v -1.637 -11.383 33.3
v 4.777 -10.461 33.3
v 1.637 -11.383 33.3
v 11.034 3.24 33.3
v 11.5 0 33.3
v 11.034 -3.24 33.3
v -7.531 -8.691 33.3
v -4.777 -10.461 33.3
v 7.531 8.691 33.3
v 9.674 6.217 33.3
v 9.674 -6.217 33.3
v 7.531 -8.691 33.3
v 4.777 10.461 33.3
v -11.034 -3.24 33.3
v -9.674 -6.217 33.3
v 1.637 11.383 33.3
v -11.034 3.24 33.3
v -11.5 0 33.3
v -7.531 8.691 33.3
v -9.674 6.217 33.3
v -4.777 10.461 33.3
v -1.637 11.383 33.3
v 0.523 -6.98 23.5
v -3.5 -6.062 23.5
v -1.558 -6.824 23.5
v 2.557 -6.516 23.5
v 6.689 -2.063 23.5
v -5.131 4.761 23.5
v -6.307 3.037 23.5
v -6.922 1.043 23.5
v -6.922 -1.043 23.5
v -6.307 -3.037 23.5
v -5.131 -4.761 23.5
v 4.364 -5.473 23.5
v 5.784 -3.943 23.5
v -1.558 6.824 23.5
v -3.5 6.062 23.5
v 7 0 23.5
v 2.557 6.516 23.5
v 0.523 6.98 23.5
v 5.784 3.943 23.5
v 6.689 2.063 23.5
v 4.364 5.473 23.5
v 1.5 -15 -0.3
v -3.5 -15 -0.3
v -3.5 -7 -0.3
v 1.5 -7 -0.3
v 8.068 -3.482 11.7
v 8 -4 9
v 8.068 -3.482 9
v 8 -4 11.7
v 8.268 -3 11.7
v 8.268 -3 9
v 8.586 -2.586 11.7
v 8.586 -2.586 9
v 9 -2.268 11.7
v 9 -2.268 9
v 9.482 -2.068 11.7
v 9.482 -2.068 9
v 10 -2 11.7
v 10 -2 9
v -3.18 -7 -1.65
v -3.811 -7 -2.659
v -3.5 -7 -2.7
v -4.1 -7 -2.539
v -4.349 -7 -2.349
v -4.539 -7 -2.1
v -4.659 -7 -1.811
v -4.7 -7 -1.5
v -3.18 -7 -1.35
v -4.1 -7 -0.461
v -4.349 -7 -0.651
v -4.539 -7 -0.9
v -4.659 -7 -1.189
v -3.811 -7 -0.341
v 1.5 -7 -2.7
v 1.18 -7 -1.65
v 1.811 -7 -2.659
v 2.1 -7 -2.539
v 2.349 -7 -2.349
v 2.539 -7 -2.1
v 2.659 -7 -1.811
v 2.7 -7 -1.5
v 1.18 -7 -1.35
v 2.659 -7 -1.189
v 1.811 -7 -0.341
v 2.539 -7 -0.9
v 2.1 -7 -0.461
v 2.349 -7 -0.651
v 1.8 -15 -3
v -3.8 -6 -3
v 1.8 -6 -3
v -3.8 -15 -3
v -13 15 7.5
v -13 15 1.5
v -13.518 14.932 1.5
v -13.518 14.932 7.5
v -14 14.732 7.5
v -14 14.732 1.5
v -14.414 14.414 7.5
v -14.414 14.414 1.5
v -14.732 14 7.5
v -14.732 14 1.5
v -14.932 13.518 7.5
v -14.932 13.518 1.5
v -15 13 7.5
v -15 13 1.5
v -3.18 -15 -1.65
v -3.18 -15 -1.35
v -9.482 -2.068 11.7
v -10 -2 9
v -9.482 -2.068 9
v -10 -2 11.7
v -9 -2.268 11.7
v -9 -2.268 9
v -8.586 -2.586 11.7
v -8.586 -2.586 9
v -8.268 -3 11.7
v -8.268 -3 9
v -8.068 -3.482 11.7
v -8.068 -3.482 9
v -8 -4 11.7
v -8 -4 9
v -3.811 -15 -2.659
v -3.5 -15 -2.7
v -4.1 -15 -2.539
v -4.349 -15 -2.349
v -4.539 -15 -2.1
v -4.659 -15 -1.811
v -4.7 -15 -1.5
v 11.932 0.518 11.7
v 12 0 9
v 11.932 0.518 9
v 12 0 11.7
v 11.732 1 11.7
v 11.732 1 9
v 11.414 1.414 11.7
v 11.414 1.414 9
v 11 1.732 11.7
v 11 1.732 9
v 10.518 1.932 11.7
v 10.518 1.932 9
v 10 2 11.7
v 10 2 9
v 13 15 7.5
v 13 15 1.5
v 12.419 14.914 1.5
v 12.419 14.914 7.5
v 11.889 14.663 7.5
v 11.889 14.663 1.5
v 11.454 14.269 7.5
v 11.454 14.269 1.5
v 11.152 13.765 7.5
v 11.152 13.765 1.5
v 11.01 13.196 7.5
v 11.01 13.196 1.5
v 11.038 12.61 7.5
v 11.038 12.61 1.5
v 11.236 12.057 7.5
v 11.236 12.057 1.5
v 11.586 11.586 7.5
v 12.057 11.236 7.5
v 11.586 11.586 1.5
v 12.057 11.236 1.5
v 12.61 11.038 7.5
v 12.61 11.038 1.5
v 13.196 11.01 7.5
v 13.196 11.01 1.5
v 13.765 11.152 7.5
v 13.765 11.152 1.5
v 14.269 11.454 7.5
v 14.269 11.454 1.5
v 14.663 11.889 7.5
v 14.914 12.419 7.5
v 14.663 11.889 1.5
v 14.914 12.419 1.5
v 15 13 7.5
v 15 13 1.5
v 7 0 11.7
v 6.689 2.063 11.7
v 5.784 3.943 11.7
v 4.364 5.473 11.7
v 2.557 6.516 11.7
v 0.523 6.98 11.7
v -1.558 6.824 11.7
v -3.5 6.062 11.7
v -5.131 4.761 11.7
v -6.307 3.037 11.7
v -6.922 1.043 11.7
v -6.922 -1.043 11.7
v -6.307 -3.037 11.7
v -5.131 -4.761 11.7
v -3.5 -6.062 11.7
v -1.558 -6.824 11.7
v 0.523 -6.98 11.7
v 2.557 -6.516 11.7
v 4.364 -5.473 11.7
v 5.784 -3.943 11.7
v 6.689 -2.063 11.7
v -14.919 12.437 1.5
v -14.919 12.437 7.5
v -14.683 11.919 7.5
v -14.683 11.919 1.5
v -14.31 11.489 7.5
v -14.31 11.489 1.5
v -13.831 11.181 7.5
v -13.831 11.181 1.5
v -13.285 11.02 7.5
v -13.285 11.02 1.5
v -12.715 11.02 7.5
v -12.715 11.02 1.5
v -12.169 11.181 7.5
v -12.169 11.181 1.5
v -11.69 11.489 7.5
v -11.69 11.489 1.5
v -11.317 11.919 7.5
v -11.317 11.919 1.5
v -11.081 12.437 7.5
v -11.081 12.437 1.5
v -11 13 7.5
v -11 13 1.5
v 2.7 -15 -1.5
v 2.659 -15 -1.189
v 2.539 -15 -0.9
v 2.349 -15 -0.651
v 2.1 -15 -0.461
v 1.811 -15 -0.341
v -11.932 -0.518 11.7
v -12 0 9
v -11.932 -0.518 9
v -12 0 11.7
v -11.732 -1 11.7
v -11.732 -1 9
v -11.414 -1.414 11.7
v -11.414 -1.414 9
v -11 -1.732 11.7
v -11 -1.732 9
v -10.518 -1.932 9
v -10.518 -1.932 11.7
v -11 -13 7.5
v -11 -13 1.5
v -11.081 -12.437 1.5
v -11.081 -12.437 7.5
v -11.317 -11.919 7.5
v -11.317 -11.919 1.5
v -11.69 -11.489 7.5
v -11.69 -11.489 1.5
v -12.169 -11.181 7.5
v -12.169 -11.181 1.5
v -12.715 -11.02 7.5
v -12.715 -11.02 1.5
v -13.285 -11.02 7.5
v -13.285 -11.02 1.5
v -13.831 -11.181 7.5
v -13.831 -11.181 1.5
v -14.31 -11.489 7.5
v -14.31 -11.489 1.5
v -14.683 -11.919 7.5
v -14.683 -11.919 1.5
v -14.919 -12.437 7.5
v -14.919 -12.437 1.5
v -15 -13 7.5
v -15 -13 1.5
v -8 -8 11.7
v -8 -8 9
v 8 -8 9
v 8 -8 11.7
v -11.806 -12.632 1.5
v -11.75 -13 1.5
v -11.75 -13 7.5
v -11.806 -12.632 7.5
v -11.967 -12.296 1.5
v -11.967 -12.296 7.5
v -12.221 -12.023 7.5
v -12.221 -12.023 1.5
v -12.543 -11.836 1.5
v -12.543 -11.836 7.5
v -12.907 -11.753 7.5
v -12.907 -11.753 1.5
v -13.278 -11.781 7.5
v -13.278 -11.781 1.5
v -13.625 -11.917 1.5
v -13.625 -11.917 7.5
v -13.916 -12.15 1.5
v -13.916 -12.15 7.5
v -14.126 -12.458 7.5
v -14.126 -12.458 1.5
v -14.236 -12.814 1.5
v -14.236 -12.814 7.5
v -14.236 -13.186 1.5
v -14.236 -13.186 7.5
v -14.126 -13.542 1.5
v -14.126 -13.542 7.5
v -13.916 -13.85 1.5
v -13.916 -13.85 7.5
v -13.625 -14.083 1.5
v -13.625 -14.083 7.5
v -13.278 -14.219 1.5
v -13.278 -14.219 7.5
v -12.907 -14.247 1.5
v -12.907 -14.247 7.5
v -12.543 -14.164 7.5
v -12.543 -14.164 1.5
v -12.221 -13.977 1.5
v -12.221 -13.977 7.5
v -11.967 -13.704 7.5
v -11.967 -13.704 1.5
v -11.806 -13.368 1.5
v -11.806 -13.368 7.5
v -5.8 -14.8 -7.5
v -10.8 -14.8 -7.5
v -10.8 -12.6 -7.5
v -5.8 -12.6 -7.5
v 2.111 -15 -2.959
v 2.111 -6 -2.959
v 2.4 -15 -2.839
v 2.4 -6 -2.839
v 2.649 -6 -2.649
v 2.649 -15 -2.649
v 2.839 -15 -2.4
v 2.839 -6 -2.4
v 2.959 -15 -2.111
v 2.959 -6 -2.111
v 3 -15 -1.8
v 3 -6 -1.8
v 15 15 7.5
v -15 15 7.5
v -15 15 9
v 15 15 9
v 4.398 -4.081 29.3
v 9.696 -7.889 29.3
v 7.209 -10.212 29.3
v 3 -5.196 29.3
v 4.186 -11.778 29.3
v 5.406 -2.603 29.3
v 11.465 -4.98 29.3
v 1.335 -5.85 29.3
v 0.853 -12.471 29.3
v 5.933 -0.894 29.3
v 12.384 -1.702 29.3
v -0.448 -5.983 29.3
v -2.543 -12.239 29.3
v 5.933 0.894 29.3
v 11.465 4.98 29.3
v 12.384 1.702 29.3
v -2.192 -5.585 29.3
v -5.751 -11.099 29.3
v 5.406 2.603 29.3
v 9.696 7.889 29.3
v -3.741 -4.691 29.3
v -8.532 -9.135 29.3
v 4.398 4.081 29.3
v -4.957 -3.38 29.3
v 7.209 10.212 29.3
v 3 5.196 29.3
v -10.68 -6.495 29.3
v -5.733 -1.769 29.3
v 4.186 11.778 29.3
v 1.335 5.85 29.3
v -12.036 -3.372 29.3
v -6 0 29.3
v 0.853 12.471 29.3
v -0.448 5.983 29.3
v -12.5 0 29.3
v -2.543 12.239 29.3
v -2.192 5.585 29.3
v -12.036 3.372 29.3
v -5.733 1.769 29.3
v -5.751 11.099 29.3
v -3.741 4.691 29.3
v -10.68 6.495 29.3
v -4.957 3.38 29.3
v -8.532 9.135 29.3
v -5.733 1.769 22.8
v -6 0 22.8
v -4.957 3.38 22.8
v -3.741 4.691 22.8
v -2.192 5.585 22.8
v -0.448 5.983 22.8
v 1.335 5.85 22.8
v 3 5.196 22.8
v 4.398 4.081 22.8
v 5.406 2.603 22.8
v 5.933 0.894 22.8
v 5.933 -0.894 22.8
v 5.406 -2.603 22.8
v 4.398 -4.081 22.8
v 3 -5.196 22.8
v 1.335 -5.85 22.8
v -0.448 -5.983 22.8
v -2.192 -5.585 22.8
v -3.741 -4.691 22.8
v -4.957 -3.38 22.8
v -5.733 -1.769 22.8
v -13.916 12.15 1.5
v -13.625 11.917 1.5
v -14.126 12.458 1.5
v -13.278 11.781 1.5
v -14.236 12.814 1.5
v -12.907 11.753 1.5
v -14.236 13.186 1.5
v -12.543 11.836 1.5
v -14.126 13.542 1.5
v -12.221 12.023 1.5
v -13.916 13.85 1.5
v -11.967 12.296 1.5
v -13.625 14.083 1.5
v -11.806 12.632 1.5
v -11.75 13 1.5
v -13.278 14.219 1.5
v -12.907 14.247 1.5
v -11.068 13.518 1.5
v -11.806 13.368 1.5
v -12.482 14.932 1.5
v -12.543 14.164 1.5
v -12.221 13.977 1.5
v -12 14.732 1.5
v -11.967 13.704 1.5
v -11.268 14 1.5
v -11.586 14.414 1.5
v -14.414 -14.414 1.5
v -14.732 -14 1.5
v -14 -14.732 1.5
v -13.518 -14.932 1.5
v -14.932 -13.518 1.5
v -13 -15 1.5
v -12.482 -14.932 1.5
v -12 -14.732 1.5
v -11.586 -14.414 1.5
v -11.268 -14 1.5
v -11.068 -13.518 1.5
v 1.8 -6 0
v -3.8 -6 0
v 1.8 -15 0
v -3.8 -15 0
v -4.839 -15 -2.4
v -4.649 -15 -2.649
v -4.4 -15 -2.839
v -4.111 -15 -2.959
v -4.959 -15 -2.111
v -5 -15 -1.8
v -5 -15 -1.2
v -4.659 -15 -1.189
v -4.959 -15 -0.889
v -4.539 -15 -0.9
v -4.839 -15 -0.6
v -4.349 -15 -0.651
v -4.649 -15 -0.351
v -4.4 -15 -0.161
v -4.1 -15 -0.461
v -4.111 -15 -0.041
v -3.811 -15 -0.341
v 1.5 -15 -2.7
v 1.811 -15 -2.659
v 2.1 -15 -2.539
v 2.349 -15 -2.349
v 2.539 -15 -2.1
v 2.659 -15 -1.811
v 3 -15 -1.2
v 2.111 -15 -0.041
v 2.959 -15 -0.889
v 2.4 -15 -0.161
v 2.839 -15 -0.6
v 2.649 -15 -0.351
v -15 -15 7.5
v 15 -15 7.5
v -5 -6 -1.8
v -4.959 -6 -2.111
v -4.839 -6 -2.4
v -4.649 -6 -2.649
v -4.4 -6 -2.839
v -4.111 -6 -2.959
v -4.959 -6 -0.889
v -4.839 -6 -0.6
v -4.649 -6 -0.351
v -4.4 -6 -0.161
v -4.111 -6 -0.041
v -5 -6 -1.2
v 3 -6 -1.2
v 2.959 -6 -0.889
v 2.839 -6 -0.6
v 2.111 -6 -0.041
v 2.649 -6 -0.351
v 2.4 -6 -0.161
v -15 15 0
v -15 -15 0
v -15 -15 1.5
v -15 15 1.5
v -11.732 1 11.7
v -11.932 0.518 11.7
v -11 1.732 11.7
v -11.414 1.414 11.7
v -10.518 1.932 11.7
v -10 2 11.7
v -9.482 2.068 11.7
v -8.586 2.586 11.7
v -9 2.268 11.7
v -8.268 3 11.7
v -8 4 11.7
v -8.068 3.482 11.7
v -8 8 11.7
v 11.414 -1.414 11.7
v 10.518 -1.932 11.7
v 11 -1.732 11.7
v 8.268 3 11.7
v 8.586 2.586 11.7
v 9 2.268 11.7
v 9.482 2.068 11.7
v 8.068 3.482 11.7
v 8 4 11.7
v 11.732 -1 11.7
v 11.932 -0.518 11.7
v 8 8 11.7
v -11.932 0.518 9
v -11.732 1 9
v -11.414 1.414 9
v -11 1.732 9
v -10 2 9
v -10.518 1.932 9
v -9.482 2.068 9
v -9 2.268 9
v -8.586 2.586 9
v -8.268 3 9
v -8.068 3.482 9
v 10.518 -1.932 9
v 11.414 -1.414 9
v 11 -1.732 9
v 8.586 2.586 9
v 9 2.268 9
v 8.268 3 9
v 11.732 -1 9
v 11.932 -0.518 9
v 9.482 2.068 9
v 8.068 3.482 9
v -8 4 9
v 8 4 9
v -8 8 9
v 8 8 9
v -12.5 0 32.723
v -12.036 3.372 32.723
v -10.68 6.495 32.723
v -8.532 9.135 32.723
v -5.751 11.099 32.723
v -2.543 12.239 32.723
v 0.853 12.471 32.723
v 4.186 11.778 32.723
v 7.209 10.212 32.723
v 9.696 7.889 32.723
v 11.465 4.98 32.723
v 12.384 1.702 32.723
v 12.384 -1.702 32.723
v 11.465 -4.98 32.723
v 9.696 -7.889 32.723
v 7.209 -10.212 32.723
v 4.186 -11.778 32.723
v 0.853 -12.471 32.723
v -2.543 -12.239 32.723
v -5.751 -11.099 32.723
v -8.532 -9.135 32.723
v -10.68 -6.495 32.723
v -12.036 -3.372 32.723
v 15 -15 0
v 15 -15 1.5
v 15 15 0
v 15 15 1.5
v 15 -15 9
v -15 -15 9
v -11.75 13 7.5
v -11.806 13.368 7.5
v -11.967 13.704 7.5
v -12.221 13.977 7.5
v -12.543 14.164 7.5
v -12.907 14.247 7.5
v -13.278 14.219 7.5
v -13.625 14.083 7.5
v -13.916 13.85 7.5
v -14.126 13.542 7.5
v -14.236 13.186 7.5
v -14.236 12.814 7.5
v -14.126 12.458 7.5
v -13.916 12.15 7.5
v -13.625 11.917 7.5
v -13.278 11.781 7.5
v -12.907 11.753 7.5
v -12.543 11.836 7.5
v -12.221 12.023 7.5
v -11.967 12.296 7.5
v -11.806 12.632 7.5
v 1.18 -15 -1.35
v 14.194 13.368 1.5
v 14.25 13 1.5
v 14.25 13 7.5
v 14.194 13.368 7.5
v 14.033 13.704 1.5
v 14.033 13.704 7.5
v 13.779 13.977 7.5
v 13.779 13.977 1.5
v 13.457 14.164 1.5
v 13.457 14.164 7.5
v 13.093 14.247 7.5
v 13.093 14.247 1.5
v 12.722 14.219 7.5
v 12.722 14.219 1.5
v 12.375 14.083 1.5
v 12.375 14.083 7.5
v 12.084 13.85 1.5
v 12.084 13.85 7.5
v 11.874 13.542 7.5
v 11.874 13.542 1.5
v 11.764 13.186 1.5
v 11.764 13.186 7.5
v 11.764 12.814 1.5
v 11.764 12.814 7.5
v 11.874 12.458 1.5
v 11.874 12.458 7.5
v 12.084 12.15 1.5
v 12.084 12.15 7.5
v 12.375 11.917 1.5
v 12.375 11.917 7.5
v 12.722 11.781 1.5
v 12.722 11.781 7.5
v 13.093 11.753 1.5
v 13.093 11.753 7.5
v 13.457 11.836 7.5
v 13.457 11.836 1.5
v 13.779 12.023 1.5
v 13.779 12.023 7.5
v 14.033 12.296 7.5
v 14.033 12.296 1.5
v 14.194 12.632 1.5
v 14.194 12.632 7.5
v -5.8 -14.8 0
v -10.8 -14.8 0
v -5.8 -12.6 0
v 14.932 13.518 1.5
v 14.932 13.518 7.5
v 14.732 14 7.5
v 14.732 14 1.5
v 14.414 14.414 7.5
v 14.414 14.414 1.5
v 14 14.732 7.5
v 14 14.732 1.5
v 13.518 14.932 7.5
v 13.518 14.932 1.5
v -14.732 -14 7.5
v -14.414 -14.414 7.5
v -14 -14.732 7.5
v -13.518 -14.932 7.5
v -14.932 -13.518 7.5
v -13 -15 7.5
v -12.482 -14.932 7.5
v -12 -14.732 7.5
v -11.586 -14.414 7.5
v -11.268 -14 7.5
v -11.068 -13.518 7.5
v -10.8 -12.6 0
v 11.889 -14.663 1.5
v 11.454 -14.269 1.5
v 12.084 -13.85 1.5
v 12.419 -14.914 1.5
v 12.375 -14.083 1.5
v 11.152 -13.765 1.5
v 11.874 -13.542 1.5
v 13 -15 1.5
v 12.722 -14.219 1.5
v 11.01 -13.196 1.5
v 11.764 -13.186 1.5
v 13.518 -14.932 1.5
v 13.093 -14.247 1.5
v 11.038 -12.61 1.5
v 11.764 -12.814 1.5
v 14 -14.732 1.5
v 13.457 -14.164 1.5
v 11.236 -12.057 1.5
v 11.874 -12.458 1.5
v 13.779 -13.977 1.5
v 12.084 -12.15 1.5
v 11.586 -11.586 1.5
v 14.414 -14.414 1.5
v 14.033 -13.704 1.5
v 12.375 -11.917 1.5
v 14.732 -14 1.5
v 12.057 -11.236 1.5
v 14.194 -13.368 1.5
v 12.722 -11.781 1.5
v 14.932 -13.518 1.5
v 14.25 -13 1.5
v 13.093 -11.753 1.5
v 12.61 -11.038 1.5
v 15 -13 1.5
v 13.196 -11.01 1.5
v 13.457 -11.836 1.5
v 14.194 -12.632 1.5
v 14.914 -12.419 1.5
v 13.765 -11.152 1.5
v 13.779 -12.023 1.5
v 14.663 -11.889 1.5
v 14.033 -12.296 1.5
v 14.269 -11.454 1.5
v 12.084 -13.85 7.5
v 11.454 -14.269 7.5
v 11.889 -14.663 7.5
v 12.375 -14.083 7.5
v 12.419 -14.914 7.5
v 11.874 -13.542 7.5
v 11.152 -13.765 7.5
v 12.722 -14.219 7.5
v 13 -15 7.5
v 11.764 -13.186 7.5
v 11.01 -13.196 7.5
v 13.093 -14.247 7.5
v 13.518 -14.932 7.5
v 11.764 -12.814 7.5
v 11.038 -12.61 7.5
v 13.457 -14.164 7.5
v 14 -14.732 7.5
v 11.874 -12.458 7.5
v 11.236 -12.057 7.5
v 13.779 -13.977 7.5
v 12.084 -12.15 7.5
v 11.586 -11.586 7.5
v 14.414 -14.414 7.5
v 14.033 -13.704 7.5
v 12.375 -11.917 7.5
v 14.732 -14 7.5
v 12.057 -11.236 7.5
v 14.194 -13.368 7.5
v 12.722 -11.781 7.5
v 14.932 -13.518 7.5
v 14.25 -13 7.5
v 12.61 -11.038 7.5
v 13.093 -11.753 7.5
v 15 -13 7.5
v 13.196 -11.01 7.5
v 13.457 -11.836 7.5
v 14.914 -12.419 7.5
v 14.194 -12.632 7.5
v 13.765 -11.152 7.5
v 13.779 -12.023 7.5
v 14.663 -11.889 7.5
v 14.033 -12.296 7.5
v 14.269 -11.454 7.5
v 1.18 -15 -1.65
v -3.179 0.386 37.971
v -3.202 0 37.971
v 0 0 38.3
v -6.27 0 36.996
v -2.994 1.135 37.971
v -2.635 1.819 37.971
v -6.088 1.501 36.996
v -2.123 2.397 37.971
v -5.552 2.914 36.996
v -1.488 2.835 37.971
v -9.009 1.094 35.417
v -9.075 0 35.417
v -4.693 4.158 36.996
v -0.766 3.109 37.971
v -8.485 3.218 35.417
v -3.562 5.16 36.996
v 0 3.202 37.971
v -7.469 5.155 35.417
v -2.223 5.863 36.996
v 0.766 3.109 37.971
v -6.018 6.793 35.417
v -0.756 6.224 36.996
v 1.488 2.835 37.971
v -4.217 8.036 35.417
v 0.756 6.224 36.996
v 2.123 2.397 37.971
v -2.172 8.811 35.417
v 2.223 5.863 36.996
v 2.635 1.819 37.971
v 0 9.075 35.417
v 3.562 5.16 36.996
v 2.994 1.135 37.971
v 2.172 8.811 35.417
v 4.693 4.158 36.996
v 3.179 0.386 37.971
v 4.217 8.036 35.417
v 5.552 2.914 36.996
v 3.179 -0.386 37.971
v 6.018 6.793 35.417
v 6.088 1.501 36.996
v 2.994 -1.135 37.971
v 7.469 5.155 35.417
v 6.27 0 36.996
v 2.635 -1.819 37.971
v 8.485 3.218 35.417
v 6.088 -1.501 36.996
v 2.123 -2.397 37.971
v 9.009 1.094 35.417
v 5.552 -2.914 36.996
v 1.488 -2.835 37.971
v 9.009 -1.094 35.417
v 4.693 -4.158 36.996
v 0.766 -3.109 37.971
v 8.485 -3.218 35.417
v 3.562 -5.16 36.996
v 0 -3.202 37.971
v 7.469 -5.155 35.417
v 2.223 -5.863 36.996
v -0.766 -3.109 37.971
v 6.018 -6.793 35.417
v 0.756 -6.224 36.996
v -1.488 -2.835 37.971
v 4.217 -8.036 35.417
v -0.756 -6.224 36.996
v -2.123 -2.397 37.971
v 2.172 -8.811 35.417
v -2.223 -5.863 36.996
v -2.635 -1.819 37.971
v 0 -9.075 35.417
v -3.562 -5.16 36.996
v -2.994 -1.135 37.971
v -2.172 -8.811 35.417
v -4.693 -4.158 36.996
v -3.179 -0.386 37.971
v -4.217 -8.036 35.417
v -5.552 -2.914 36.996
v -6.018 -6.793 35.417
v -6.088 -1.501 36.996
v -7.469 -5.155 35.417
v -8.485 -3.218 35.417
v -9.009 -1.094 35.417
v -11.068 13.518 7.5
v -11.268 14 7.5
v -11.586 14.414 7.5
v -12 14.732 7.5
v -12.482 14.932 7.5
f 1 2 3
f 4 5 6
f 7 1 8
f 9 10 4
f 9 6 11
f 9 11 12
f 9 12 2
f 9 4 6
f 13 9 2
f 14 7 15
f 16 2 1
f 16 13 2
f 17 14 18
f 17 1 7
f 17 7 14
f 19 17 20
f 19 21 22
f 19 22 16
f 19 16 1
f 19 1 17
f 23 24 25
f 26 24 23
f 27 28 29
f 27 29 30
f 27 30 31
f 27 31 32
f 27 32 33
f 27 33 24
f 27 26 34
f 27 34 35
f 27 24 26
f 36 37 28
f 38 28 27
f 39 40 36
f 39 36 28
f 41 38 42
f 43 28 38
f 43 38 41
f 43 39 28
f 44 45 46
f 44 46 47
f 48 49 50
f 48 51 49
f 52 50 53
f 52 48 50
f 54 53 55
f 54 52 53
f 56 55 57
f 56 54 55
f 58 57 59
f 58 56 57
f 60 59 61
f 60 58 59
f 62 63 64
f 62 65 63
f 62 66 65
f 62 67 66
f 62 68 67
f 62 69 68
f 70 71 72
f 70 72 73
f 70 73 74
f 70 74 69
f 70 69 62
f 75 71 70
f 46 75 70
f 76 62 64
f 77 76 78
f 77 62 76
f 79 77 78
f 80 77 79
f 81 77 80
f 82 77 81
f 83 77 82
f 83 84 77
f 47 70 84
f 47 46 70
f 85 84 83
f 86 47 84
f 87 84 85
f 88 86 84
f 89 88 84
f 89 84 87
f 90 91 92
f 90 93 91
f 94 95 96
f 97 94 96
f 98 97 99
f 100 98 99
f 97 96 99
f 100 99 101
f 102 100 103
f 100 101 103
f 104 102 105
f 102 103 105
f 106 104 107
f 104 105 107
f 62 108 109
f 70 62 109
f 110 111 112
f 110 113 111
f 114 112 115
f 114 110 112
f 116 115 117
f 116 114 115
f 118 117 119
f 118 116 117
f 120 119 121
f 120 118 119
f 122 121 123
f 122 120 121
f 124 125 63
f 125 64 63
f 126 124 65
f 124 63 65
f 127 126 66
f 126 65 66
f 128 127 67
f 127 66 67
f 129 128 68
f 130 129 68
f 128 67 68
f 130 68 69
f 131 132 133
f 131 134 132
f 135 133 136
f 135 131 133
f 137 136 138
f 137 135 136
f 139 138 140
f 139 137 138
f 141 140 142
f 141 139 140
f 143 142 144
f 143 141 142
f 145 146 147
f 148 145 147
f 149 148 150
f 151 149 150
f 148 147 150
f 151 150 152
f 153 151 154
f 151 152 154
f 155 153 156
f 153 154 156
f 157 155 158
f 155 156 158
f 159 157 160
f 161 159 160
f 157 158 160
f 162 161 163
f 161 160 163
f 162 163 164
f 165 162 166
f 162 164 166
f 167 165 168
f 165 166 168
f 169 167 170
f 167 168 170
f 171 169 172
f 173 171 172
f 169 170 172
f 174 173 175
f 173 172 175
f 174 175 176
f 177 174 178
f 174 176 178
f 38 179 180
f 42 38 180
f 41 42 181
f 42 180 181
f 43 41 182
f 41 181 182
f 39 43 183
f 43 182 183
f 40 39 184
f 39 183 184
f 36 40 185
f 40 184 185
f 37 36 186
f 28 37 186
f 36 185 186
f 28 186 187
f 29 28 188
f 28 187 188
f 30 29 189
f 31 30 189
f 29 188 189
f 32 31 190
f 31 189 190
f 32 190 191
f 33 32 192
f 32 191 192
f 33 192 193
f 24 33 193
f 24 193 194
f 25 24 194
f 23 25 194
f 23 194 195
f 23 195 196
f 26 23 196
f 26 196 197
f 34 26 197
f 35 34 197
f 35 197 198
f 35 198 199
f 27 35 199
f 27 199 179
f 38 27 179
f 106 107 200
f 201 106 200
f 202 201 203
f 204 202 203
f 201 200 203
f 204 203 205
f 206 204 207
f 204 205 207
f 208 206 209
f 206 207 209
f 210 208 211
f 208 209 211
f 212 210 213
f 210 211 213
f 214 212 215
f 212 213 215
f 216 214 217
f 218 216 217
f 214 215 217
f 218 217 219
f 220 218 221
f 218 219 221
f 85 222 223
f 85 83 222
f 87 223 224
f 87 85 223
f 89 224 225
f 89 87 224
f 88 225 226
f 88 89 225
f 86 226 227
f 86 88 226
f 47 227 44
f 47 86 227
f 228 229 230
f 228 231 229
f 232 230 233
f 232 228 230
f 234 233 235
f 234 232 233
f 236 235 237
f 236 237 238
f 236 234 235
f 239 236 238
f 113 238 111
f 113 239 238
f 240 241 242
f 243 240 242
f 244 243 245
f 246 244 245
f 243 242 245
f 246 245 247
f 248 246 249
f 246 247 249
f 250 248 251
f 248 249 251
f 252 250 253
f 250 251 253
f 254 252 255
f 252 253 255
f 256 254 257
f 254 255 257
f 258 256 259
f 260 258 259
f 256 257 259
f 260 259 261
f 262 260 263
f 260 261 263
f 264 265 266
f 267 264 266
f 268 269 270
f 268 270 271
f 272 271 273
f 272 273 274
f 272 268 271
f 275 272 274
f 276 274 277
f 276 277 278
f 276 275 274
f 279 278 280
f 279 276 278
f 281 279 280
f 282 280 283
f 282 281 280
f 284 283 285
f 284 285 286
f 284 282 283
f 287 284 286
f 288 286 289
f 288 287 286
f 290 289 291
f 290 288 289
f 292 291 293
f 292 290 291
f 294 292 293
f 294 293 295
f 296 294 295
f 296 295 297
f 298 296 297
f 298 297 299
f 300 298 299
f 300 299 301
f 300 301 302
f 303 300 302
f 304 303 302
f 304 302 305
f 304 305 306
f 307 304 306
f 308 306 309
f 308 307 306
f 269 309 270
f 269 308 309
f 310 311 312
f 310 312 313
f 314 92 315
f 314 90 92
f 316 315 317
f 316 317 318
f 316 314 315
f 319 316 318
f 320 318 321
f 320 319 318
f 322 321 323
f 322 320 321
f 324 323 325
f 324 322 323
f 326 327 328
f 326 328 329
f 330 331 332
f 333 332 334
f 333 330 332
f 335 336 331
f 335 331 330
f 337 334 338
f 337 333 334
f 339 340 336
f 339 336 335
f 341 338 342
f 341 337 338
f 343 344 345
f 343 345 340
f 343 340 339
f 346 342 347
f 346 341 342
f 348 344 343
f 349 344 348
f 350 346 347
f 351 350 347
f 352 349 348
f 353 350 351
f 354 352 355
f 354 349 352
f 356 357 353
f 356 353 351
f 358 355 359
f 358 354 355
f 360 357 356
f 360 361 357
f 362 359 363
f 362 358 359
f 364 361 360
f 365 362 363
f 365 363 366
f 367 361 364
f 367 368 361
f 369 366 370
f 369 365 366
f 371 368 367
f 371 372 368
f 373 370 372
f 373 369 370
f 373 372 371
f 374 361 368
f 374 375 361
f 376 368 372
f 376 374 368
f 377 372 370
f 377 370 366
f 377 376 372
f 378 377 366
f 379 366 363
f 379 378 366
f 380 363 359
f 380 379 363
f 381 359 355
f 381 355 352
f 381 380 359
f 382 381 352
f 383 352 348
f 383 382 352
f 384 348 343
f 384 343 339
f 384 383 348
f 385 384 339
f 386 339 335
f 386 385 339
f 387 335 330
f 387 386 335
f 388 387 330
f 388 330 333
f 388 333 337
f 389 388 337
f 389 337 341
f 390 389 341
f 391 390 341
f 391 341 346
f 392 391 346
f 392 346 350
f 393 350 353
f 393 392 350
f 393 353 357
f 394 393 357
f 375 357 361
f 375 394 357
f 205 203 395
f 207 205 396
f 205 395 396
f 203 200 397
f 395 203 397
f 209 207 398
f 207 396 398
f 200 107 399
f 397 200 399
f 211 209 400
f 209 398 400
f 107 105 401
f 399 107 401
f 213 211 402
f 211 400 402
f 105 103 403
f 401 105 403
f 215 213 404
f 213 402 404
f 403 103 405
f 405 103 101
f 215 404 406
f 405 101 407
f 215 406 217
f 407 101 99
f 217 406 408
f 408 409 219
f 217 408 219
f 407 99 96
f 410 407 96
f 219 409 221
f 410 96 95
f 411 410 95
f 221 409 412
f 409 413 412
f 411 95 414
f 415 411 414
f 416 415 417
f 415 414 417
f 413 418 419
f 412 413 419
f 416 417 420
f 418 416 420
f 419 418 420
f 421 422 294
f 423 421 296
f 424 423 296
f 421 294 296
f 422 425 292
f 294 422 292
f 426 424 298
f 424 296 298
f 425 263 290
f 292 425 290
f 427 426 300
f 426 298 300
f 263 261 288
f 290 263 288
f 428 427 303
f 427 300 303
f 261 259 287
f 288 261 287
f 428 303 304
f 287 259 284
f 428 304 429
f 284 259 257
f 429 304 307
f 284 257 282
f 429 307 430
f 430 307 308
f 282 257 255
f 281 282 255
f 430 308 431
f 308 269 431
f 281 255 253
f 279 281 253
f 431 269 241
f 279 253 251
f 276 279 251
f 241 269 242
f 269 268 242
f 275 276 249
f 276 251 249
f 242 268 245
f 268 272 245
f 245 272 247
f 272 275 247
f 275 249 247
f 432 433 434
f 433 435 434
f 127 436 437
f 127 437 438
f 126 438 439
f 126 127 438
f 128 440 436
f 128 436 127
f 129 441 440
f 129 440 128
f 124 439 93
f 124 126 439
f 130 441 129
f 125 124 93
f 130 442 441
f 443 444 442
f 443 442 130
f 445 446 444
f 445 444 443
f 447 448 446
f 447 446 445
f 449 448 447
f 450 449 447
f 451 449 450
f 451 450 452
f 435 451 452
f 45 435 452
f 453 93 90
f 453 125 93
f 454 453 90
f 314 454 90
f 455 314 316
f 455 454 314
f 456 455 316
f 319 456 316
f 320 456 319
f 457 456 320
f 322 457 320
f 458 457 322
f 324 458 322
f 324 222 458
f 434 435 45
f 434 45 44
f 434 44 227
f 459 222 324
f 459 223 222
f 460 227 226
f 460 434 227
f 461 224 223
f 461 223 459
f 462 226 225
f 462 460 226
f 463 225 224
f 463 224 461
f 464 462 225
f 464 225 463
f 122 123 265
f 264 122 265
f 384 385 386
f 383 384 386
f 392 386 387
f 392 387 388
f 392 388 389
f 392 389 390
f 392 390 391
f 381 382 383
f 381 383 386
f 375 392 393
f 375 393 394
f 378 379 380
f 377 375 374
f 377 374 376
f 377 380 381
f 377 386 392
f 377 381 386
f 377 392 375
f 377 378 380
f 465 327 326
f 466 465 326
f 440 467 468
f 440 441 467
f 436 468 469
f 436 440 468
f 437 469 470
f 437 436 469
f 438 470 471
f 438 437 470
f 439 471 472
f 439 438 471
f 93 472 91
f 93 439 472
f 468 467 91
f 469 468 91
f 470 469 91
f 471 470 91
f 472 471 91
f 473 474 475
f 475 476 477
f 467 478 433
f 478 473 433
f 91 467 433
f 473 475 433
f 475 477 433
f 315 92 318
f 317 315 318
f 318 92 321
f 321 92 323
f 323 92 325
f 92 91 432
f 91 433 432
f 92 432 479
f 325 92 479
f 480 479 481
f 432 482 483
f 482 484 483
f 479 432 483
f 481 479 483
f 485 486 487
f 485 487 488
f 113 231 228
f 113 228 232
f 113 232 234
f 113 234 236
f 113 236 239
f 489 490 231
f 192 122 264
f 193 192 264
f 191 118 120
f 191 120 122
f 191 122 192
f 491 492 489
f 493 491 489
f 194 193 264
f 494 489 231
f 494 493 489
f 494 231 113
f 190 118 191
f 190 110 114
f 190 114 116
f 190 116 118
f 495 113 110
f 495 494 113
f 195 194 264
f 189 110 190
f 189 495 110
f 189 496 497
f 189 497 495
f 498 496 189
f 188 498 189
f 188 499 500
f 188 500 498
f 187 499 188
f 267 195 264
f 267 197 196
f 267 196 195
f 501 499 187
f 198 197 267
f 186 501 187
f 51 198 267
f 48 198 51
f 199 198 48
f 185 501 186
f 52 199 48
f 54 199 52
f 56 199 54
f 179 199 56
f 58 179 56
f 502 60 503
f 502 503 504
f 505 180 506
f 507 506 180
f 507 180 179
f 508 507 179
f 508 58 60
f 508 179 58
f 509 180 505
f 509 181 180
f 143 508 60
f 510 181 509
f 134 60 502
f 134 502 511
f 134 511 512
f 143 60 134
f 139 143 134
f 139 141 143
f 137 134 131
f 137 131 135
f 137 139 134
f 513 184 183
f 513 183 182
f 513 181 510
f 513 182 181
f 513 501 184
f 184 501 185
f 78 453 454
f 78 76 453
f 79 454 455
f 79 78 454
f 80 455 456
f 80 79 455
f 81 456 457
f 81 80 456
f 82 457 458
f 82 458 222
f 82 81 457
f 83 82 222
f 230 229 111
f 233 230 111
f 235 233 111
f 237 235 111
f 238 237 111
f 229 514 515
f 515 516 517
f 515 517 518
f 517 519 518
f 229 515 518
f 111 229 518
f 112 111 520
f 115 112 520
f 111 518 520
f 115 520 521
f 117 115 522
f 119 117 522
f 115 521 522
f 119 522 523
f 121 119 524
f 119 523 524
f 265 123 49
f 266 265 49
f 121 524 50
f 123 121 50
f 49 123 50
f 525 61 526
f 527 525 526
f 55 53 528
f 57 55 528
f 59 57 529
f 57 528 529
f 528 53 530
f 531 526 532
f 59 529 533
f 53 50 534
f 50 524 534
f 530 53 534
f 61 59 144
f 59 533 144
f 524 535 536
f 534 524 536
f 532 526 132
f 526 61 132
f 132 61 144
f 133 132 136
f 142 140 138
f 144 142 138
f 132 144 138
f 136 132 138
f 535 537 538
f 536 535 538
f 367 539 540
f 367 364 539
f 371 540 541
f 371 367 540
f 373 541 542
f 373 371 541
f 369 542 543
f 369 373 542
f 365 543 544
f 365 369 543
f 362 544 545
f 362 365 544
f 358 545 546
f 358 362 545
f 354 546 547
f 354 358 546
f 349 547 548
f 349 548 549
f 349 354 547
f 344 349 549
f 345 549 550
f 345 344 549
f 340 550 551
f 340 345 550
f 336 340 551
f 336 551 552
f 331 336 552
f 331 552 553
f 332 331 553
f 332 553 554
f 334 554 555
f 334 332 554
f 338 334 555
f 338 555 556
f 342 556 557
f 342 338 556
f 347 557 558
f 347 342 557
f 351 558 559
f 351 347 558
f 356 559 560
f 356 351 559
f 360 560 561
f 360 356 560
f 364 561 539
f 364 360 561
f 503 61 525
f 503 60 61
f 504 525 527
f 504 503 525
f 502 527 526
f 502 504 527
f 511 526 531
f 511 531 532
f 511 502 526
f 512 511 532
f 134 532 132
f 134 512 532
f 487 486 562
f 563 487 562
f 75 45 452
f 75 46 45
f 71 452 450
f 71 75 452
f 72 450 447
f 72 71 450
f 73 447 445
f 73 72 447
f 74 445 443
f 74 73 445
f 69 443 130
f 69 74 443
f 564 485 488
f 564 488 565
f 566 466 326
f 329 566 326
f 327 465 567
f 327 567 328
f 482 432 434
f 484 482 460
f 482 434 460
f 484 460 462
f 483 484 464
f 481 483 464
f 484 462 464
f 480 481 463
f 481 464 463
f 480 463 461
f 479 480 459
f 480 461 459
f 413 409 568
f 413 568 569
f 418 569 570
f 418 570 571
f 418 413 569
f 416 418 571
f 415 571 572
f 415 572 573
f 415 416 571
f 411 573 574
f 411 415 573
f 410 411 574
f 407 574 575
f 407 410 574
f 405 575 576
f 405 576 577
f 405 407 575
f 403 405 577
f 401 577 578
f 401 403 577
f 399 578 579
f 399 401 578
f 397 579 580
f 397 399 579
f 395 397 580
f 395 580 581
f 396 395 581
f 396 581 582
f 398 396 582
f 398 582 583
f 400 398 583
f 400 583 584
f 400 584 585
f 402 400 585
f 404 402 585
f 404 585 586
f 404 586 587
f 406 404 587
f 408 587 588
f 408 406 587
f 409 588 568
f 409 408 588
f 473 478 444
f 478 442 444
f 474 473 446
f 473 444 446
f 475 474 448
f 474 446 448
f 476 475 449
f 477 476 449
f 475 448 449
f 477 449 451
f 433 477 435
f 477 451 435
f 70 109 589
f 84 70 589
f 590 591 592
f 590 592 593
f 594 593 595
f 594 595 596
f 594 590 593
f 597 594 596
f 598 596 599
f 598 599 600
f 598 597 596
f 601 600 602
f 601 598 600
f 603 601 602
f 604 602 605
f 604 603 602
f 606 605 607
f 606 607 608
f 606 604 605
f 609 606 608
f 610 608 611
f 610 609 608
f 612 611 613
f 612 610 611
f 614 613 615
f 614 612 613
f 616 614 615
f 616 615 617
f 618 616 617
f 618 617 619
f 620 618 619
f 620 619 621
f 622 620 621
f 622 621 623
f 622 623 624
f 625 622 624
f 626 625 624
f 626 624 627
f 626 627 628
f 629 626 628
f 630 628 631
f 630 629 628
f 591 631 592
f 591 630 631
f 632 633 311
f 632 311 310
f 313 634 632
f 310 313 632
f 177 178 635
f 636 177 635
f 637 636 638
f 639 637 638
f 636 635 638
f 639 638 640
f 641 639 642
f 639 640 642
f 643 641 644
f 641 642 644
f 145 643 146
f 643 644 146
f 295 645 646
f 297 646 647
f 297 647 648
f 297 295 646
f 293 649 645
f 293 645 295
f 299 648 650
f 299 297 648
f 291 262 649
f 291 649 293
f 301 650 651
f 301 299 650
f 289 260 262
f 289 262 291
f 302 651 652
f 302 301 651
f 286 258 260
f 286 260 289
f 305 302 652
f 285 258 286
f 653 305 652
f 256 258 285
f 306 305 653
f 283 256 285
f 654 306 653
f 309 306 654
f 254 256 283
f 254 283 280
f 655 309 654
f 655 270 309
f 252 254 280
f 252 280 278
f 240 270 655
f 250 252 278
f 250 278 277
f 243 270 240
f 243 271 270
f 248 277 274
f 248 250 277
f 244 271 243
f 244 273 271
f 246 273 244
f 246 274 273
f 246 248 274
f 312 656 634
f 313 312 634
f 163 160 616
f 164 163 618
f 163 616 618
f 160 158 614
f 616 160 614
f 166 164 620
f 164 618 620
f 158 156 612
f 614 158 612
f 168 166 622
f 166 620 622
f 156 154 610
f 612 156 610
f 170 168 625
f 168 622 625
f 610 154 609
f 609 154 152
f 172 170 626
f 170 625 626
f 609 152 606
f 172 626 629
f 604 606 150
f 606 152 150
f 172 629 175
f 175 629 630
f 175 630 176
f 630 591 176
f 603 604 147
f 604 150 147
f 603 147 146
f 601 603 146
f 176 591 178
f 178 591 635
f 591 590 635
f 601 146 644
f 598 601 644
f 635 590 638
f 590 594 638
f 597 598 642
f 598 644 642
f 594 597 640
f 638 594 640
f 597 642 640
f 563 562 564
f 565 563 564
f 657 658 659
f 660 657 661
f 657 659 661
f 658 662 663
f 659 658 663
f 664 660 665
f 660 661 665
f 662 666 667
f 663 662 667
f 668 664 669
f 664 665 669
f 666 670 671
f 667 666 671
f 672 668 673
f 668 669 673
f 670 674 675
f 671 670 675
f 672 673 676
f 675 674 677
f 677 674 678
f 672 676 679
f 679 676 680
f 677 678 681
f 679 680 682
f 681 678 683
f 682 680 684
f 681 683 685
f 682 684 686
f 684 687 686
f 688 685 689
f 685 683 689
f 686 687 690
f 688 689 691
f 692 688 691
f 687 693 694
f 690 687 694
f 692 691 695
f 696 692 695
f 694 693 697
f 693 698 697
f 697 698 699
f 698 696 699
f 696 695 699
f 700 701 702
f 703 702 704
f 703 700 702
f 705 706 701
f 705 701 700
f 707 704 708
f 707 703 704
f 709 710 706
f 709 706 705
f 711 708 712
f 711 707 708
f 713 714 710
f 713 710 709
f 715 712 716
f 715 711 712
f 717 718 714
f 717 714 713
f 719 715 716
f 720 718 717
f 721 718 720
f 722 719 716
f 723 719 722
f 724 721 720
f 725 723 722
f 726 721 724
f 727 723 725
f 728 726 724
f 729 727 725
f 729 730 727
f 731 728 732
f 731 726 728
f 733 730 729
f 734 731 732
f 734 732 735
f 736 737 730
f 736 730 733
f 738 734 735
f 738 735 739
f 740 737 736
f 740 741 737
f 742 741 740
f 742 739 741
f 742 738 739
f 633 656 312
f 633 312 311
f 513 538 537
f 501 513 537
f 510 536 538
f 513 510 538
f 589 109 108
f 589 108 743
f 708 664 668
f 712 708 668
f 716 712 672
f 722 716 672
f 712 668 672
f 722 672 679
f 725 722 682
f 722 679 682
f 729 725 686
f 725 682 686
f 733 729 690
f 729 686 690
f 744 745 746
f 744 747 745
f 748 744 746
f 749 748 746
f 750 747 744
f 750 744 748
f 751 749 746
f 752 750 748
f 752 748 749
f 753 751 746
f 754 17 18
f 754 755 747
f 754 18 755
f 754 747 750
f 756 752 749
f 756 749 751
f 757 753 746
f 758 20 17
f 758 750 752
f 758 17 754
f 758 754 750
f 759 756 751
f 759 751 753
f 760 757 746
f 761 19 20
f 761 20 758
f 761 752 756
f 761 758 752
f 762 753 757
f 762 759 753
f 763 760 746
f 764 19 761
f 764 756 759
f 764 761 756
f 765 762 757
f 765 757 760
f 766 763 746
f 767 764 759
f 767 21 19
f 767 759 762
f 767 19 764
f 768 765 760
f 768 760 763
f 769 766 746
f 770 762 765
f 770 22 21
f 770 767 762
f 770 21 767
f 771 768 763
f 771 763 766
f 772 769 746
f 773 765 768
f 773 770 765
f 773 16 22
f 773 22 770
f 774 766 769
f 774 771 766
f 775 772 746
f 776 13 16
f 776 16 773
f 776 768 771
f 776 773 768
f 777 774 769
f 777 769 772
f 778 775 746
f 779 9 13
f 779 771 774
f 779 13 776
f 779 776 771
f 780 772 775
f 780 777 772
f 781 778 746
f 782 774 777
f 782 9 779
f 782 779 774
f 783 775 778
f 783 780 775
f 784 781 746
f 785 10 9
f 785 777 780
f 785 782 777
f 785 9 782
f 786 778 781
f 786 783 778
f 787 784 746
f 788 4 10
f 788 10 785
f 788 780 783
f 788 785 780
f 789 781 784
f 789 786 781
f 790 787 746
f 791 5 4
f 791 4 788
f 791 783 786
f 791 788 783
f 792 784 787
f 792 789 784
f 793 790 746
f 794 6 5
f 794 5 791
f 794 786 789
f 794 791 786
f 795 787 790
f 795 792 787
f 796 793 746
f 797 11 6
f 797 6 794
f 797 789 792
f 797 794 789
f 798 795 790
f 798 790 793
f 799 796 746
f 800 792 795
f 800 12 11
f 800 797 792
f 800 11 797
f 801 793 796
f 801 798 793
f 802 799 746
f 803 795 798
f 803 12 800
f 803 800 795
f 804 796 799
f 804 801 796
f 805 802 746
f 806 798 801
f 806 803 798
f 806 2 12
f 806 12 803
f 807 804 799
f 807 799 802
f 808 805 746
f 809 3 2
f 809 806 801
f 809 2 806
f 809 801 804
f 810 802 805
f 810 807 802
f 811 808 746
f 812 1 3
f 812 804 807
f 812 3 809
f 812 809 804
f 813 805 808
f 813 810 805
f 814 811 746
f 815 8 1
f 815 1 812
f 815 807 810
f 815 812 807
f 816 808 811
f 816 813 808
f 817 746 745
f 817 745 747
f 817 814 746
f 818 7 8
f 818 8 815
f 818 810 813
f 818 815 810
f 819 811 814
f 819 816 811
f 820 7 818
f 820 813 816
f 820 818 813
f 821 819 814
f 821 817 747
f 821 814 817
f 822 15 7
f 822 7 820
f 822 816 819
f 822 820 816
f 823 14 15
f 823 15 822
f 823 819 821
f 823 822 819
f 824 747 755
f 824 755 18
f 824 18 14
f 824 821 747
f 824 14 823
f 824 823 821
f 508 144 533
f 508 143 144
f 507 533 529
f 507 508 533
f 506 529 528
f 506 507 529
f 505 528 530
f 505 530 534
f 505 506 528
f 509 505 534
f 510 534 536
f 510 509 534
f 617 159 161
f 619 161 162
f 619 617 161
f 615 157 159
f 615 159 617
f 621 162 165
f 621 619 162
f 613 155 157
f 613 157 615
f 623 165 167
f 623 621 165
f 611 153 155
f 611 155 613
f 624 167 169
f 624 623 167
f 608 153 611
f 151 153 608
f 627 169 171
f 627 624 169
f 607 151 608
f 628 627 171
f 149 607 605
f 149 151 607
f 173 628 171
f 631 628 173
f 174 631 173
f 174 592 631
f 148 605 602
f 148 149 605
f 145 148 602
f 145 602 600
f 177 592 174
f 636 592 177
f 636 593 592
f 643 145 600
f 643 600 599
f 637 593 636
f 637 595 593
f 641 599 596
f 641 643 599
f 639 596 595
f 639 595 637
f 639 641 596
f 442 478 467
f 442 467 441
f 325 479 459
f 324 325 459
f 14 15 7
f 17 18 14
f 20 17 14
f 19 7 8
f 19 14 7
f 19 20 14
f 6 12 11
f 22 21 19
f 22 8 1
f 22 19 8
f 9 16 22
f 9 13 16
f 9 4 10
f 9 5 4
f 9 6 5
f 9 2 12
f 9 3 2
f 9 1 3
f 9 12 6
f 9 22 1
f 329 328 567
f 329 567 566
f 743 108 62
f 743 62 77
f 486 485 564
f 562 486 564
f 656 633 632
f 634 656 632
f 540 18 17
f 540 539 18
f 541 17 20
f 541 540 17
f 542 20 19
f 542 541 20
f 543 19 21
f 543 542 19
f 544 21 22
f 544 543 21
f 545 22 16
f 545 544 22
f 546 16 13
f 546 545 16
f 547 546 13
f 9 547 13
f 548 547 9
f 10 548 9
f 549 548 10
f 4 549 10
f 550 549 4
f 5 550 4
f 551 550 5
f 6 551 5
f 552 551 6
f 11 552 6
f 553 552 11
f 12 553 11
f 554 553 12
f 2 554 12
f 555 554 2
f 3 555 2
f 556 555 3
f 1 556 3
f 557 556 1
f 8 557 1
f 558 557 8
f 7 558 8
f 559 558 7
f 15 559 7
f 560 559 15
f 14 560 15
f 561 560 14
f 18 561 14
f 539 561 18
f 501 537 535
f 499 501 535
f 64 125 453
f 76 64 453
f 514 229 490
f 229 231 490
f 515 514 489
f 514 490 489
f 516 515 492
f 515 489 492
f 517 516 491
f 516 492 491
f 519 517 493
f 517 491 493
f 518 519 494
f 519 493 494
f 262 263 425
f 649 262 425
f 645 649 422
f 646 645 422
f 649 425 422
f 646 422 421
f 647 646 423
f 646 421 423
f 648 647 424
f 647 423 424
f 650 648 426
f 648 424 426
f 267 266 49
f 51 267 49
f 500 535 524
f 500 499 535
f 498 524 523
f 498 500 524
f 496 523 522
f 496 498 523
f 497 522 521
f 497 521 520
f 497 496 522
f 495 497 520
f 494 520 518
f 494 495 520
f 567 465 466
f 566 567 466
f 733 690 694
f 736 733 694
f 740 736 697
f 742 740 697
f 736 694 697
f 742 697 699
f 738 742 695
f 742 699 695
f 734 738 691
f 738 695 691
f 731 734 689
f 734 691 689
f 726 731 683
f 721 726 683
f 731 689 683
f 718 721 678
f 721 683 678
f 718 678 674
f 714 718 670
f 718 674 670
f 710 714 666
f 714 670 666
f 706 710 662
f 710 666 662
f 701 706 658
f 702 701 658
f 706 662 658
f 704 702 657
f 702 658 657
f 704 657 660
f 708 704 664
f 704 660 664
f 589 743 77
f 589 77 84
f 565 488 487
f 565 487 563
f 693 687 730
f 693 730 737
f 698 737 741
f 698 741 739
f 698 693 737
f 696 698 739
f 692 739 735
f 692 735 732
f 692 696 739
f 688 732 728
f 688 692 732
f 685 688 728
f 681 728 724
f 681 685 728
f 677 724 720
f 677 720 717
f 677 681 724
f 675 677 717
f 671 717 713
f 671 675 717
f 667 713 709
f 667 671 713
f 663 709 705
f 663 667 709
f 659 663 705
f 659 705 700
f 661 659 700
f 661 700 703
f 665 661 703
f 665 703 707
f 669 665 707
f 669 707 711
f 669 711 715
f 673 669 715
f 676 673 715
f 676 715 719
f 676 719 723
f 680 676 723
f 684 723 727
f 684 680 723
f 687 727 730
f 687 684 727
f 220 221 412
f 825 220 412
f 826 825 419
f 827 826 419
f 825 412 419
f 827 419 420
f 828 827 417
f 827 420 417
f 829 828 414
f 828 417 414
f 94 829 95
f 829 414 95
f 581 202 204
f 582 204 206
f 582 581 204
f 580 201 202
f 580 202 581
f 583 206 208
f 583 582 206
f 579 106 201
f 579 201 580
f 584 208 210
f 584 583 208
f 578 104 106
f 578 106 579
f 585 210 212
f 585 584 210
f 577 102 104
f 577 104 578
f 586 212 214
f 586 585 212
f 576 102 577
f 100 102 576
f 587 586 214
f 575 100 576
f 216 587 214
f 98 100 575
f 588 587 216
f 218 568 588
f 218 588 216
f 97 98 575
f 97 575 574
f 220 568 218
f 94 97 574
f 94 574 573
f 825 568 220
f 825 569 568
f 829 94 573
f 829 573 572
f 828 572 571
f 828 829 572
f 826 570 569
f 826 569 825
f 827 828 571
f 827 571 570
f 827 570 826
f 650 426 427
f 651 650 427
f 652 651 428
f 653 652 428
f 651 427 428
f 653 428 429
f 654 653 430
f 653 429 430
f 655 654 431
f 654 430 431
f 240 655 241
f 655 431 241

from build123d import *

# Parameters (mm, degrees)
F0_W      = 30
F0_H      = 30
F1_DEPTH  = 1.5
F2_START  = 6
F1_FACE_W = 30
F1_FACE_H = 30
F2_DEPTH  = 1.5
F3_R      = 1.25
F4_DEPTH  = 6
F5_W      = 4
F5_H      = 4
F5_R      = 7
F6_DEPTH  = 2.7
F7_R      = 1.99999
F8_DEPTH  = 14.5
F9_W      = 6
F9_H      = 1.5
F9_H_2    = 5
F12_W     = 8
F12_H     = 9
F13_DEPTH = 3
F14_W     = 7.4
F14_H     = 2.4
F14_W_2   = 4.36
F14_H_2   = 0.3
F15_DEPTH = 8
F16_R     = 1.19999
F17_W     = 5
F17_H     = 2.2
F18_DEPTH = 7.5


# Not quite as in the source:
# - a fillet or chamfer is up to 0.001 mm smaller than in the source, because OpenCascade refuses the exact size


with BuildPart() as f1:
    # F0 (on Top) → F1 (new body)
    with BuildSketch(Plane.XY):
        Rectangle(F0_W, F0_H)
    extrude(amount=F1_DEPTH)


with BuildPart() as f2:
    # F1_face (on face) → F2 (new body)
    with BuildSketch(Plane.XY.offset(1.5).offset(F2_START)):
        Rectangle(F1_FACE_W, F1_FACE_H)
    extrude(amount=F2_DEPTH)


with BuildPart() as f4:
    # F3 (on face) → F4 (new body)
    with BuildSketch(Plane.XY.offset(1.5)):
        with BuildLine():
            ThreePointArc((-11, 13), (-11.5857864376, 14.4142135624), (-13, 15))
            ThreePointArc((-13, 15), (-14.4142135624, 14.4142135624), (-15, 13))
            ThreePointArc((-15, 13), (-13, 11), (-11, 13))
        make_face()
        with Locations((-13, 13)):
            Circle(F3_R, mode=Mode.SUBTRACT)
    extrude(amount=F4_DEPTH)


with BuildPart() as f4b:
    # F3 (on face) → F4, piece 2 (new body)
    with BuildSketch(Plane.XY.offset(1.5)):
        with BuildLine():
            ThreePointArc((-15, -13), (-14.4142135624, -14.4142135624), (-13, -15))
            ThreePointArc((-13, -15), (-11.5857864376, -14.4142135624), (-11, -13))
            ThreePointArc((-11, -13), (-13, -11), (-15, -13))
        make_face()
        with Locations((-13, -13)):
            Circle(F3_R, mode=Mode.SUBTRACT)
    extrude(amount=F4_DEPTH)


with BuildPart() as f4c:
    # F3 (on face) → F4, piece 3 (new body)
    with BuildSketch(Plane.XY.offset(1.5)):
        with BuildLine():
            ThreePointArc((13, -15), (14.4142135624, -14.4142135624), (15, -13))
            ThreePointArc((15, -13), (11.5857864376, -11.5857864376), (13, -15))
        make_face()
        with Locations((13, -13)):
            Circle(F3_R, mode=Mode.SUBTRACT)
    extrude(amount=F4_DEPTH)


with BuildPart() as f4d:
    # F3 (on face) → F4, piece 4 (new body)
    with BuildSketch(Plane.XY.offset(1.5)):
        with BuildLine():
            ThreePointArc((13, 15), (11.5857864376, 11.5857864376), (15, 13))
            ThreePointArc((15, 13), (14.4142135624, 14.4142135624), (13, 15))
        make_face()
        with Locations((13, 13)):
            Circle(F3_R, mode=Mode.SUBTRACT)
    extrude(amount=F4_DEPTH)


with BuildPart() as f6:
    # F5 (on face) → F6 (new body)
    with BuildSketch(Plane.XY.offset(9)):
        with Locations((-10, 0)):
            Rectangle(F5_W, F5_H)
        Polygon((-8, -8), (8, -8), (8, -2), (8, 2), (8, 8), (-8, 8), (-8, 2), (-8, -2), align=None)
        Circle(F5_R, mode=Mode.SUBTRACT)
        with Locations((10, 0)):
            Rectangle(F5_W, F5_H)
        Circle(F5_R)
    extrude(amount=F6_DEPTH)

    # F7 (radius 2 in the source; OpenCascade refuses exactly that, so slightly less here)
    f7_edges = [f6.edges().sort_by_distance(p)[0] for p in [
        (-12, 2, 10.35),
        (-12, -2, 10.35),
        (-8, 2, 10.35),
        (-8, -2, 10.35),
        (12, -2, 10.35),
        (8, -2, 10.35),
        (8, 2, 10.35),
        (12, 2, 10.35),
    ]]
    fillet(f7_edges, radius=F7_R)

    # F5 (on face) → F8 (join)
    with BuildSketch(Plane.XY.offset(9)):
        Circle(F5_R)
    extrude(amount=F8_DEPTH)


with BuildPart() as f10:
    # F9 (on Front) → F10 (revolve)
    with BuildSketch(Plane.XZ):
        with BuildLine():
            Line((-11.5, 33.3), (0, 33.3))
            Line((0, 33.3), (0, 38.3))
            ThreePointArc((0, 38.3), (-6.269968102, 36.9959266346), (-11.5, 33.3))
        make_face()
    revolve(axis=Axis((0, 0, 25.3), (0, 0, -1)))


with BuildPart() as f11:
    # F9 (on Front) → F11 (revolve)
    with BuildSketch(Plane.XZ):
        Polygon((-6, 29.3), (0, 29.3), (0, 33.3), (-11.5, 33.3), (-12.5, 32.7226497308), (-12.5, 29.3), align=None)
        with Locations((-3, 28.55)):
            Rectangle(F9_W, F9_H)
        with Locations((-3, 25.3)):
            Rectangle(F9_W, F9_H_2)
    revolve(axis=Axis((0, 0, 25.3), (0, 0, -1)))


with BuildPart() as f13:
    # F12 (on face) → F13 (new body)
    with BuildSketch(Plane(origin=(0, 0, 0), x_dir=(1, 0, 0), z_dir=(0, 0, -1))):
        with Locations((-1, 10.5)):
            Rectangle(F12_W, F12_H)
    extrude(amount=F13_DEPTH)

    # F14 (on face) → F15 (cut)
    with BuildSketch(Plane.XZ.offset(15)):
        with Locations((-1, -1.5)):
            Rectangle(F14_W, F14_H)
        with Locations((-1, -1.5)):
            Rectangle(F14_W_2, F14_H_2, mode=Mode.SUBTRACT)
    extrude(amount=-F15_DEPTH, mode=Mode.SUBTRACT)

    # F16 (radius 1.2 in the source; OpenCascade refuses exactly that, so slightly less here)
    f16_edges = [f13.edges().sort_by_distance(p)[0] for p in [
        (-5, -10.5, -3),
        (-5, -10.5, 0),
        (3, -10.5, 0),
        (3, -10.5, -3),
        (-4.7, -11, -0.3),
        (2.7, -11, -0.3),
        (2.7, -11, -2.7),
        (-4.7, -11, -2.7),
    ]]
    fillet(f16_edges, radius=F16_R)


with BuildPart() as f18:
    # F17 (on face) → F18 (new body)
    with BuildSketch(Plane(origin=(0, 0, 0), x_dir=(1, 0, 0), z_dir=(0, 0, -1))):
        with Locations((-8.3, 13.7)):
            Rectangle(F17_W, F17_H)
    extrude(amount=F18_DEPTH)


solid = Compound([f1.part, f2.part, f4.part, f4b.part, f4c.part, f4d.part, f6.part, f10.part, f11.part, f13.part, f18.part])
